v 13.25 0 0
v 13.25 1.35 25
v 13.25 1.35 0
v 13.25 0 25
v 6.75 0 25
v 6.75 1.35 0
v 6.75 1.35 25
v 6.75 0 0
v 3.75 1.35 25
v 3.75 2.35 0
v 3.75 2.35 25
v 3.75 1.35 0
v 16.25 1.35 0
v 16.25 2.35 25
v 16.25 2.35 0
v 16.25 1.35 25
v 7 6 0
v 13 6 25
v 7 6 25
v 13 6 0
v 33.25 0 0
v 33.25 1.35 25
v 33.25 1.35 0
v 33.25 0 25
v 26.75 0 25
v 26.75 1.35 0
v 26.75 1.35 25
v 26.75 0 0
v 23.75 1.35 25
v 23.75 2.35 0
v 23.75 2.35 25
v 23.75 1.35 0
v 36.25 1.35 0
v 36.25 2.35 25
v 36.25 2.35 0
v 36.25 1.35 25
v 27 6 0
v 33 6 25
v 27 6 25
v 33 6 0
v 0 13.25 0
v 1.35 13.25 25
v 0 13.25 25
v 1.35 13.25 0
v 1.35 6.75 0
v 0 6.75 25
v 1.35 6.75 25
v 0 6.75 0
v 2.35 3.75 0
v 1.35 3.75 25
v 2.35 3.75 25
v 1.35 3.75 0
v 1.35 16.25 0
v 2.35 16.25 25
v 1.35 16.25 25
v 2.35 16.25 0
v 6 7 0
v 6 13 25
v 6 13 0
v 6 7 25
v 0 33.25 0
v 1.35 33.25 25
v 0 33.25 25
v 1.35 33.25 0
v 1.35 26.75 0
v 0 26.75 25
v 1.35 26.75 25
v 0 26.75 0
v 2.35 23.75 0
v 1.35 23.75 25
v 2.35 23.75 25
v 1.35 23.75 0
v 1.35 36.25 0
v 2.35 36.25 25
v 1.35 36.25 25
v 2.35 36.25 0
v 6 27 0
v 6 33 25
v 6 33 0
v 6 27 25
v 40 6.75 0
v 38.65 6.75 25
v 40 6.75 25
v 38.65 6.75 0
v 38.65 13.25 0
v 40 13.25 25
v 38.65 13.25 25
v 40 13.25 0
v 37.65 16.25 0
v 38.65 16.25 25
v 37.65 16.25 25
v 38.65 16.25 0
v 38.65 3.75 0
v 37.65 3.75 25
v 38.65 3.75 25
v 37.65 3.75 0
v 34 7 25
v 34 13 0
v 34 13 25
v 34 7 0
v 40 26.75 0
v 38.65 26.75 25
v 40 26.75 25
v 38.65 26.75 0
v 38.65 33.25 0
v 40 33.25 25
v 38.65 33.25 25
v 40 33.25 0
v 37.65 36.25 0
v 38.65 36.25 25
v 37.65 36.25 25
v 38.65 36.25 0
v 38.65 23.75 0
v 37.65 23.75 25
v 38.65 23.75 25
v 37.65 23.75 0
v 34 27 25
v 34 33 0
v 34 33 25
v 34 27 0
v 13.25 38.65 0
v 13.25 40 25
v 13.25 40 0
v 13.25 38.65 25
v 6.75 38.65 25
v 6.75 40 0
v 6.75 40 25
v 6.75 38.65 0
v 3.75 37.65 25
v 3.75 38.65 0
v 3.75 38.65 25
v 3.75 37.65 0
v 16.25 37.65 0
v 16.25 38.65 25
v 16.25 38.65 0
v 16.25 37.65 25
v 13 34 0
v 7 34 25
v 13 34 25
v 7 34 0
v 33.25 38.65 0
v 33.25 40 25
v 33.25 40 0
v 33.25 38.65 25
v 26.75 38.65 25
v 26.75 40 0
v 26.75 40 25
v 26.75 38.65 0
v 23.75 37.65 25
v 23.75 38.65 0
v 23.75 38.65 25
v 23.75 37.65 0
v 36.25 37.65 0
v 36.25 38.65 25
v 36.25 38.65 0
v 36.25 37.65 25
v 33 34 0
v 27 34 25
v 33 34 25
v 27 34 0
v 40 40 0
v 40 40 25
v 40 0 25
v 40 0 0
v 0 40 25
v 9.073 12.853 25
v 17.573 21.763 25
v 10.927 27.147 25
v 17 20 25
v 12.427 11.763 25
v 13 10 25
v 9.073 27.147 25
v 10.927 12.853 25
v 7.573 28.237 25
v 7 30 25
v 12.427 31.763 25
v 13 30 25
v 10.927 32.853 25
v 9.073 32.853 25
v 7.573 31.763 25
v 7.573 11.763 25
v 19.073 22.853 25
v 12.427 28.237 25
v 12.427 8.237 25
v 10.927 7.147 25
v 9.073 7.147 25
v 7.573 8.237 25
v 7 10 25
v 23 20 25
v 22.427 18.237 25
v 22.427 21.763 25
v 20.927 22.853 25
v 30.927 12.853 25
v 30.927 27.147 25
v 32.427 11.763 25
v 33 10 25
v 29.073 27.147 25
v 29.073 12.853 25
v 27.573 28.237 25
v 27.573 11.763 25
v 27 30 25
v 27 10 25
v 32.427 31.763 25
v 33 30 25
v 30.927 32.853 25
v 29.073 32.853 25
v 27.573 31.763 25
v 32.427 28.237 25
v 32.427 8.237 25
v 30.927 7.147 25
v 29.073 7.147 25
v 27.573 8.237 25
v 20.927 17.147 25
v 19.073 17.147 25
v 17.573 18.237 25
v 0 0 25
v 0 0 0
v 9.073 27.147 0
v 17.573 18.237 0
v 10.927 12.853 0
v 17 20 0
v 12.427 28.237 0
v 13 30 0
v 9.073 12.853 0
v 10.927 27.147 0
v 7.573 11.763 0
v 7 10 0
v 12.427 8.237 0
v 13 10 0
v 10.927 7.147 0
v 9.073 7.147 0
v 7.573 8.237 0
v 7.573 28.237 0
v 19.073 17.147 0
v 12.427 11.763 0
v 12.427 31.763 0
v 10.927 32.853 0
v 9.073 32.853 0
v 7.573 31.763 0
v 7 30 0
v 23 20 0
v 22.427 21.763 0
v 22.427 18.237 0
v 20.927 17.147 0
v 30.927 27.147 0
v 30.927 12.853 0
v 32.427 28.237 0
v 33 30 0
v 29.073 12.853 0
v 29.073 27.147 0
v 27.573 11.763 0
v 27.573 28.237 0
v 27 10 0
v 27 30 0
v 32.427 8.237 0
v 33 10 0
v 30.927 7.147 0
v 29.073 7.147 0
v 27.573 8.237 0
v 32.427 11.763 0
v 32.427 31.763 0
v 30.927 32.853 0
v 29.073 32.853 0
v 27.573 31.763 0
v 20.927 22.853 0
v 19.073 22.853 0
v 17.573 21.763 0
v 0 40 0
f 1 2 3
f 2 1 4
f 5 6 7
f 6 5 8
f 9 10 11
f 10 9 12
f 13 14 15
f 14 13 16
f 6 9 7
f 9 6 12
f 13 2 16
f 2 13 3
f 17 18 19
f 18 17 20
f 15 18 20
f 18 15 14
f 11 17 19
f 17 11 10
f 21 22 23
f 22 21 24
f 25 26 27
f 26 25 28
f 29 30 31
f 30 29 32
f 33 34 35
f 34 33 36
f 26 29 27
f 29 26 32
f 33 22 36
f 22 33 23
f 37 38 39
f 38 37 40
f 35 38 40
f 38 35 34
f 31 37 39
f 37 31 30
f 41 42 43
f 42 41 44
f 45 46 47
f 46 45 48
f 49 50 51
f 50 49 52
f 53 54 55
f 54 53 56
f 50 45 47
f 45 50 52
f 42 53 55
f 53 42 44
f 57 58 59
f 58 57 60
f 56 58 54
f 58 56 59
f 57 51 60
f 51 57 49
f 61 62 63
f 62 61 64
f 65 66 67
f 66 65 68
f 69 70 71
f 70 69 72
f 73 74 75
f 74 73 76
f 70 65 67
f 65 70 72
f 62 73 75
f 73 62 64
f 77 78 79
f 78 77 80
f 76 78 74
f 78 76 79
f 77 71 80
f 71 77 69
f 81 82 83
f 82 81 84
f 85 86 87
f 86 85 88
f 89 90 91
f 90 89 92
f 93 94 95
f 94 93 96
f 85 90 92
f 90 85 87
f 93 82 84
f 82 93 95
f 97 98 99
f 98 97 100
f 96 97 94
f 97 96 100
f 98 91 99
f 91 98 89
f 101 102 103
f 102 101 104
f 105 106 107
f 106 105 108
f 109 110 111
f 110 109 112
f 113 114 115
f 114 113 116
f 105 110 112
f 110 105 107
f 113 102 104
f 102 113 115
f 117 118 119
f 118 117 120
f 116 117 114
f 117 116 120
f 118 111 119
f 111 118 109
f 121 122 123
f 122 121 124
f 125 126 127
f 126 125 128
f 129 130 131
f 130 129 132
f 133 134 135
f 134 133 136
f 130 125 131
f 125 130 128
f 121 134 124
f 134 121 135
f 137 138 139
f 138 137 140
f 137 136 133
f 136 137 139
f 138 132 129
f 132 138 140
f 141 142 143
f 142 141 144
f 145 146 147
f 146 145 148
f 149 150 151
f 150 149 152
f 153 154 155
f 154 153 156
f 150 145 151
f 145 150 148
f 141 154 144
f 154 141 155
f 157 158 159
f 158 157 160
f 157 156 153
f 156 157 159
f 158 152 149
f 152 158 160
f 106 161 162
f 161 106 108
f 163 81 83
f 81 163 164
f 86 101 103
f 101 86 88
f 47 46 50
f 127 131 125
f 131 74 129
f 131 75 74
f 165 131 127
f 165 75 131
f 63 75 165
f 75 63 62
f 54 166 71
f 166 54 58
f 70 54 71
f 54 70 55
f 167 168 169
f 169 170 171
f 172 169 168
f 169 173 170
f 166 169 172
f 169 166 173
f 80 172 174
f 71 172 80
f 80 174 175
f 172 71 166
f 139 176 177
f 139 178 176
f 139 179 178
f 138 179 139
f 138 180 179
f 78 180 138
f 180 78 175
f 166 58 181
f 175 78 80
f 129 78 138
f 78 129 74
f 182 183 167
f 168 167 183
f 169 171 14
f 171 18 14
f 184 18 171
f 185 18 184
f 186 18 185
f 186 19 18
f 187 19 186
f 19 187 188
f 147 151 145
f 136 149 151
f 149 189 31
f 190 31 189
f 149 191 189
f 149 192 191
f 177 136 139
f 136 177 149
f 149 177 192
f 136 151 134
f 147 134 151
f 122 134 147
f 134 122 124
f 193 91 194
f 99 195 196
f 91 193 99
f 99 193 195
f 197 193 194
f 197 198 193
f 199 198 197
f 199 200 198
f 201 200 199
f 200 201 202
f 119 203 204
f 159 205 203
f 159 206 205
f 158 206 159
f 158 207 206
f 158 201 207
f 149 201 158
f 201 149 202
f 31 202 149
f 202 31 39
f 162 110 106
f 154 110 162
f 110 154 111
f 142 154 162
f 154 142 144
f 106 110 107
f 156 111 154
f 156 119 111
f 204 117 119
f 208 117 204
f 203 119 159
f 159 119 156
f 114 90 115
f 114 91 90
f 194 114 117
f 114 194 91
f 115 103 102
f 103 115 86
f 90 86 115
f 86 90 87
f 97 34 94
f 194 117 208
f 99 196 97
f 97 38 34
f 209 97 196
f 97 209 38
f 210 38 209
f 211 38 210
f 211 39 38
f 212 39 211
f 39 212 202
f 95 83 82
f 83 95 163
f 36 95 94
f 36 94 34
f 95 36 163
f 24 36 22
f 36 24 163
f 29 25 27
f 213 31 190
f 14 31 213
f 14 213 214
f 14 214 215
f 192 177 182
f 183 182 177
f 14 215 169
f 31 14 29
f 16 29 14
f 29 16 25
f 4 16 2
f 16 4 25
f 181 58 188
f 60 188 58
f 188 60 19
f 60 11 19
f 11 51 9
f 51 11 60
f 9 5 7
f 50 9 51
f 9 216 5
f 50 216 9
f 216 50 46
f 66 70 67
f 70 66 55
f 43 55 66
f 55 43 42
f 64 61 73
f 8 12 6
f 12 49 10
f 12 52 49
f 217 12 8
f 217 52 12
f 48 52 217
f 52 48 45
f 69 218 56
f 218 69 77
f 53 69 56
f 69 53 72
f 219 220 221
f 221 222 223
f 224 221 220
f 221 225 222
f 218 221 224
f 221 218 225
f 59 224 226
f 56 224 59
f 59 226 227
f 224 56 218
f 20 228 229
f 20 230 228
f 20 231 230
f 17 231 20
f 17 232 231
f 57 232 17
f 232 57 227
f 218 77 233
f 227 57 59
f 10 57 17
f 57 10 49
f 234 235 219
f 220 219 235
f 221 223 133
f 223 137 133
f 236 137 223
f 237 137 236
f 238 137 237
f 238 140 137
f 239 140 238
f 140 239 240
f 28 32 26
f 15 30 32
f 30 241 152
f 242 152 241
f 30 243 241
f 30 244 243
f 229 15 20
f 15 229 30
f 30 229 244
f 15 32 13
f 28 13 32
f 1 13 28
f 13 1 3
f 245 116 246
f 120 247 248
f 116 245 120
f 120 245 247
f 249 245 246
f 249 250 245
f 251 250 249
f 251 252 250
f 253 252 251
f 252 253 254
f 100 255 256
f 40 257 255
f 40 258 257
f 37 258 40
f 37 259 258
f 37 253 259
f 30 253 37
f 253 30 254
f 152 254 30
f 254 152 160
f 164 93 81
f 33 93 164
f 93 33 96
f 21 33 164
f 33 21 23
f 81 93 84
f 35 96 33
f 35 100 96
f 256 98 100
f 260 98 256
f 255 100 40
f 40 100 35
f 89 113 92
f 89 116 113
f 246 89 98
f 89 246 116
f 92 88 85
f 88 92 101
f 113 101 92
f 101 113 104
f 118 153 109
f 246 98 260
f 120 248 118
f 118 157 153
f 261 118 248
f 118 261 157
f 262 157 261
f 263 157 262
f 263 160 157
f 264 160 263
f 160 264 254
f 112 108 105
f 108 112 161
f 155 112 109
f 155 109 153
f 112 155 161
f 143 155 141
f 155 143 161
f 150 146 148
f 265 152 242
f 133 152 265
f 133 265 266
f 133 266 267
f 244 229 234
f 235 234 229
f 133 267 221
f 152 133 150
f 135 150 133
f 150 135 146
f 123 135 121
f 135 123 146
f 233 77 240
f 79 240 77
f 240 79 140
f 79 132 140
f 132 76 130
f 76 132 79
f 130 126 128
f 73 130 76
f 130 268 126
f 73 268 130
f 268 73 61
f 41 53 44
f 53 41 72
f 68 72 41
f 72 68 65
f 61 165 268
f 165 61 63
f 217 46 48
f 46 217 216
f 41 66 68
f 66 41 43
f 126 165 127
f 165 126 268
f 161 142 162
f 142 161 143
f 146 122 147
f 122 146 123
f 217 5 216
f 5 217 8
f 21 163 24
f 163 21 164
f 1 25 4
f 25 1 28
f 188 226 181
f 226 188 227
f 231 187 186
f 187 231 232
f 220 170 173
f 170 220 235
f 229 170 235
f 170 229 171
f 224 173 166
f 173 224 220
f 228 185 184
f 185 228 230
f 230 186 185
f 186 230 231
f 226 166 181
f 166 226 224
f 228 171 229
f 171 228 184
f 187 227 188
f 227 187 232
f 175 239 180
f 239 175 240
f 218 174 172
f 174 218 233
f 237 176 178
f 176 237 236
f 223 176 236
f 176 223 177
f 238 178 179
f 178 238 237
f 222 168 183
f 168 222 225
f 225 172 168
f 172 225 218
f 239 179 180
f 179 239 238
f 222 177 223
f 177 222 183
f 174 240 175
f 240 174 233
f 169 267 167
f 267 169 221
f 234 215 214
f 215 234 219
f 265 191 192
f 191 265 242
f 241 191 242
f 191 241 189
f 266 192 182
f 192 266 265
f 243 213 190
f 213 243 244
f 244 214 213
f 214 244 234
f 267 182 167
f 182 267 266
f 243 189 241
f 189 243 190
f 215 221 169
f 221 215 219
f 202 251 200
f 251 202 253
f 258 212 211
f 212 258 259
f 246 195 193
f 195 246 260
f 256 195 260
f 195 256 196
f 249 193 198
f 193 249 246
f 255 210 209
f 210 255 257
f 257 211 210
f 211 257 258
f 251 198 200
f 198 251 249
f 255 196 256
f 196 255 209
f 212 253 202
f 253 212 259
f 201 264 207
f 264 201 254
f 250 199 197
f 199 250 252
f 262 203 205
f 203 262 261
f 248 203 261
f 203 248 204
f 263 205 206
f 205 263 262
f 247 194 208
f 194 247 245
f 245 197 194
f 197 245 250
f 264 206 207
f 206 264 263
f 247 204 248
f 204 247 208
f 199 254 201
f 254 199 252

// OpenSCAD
//Specify the height
Height = 25 ; // [1:1:500]
//Specify the inner diameter
InnerDiameter = 6 ; // [5:1:6]

4040_Profile ();
module 4040_Profile() {
    color ("silver")
    difference () {
        translate ([0,0,0]) cube ([40,40,Height]);
        translate ([10,10,-1]) cylinder(d=InnerDiameter,h=+Height+2);
        translate ([10,30,-1]) cylinder(d=InnerDiameter,h=+Height+2);
        translate ([20,20,-1]) cylinder(d=InnerDiameter,h=+Height+2);
        translate ([30,10,-1]) cylinder(d=InnerDiameter,h=+Height+2);
        translate ([30,30,-1]) cylinder(d=InnerDiameter,h=+Height+2);

        translate ([0,0,0]) 4040_ProfileCutOut (Height=Height);             //bottom left
        translate ([20,0,0]) 4040_ProfileCutOut (Height=Height);            //bottom right

        translate ([0,0,0]) mirror ([1,0,0]) rotate ([0,0,90]) 4040_ProfileCutOut (Height=Height); //leftside bottom
        translate ([0,20,0]) mirror ([1,0,0]) rotate ([0,0,90]) 4040_ProfileCutOut (Height=Height); //leftside top
        
        *translate ([0,20,0]) mirror ([0,1,0]) 4040_ProfileCutOut (Height=Height);
        
        translate ([40,20,0]) rotate ([0,0,-90]) mirror ([0,1,0]) 4040_ProfileCutOut (Height=Height); //rightside bottom
        translate ([40,40,0]) rotate ([0,0,-90]) mirror ([0,1,0]) 4040_ProfileCutOut (Height=Height); //rightside top 

        *translate ([0,20,0]) 4040_ProfileCutOut (Height=Height);
        translate ([0,40,0]) mirror ([0,1,0]) 4040_ProfileCutOut (Height=Height); //Top Left
        translate ([20,40,0]) mirror ([0,1,0]) 4040_ProfileCutOut (Height=Height); //Top right
        *translate ([20,40,0]) rotate ([0,0,-90]) mirror ([0,1,0]) 4040_ProfileCutOut (Height=Height);
    }
}
*translate ([0,0,0]) 4040_ProfileCutOut (Height=50,InnerDiameter=5);
module 4040_ProfileCutOut () {    
    color ("silver")
    union () {
        translate ([10-3.25,-0.5,-1]) cube ([6.5,6,Height+2]);
        hull () {
            translate ([10-6.25,1.35,-1]) cube ([12.5,1,Height+2]);
            translate ([10-3,5,-1]) cube ([6,1,Height+2]);
        }
    }
}
